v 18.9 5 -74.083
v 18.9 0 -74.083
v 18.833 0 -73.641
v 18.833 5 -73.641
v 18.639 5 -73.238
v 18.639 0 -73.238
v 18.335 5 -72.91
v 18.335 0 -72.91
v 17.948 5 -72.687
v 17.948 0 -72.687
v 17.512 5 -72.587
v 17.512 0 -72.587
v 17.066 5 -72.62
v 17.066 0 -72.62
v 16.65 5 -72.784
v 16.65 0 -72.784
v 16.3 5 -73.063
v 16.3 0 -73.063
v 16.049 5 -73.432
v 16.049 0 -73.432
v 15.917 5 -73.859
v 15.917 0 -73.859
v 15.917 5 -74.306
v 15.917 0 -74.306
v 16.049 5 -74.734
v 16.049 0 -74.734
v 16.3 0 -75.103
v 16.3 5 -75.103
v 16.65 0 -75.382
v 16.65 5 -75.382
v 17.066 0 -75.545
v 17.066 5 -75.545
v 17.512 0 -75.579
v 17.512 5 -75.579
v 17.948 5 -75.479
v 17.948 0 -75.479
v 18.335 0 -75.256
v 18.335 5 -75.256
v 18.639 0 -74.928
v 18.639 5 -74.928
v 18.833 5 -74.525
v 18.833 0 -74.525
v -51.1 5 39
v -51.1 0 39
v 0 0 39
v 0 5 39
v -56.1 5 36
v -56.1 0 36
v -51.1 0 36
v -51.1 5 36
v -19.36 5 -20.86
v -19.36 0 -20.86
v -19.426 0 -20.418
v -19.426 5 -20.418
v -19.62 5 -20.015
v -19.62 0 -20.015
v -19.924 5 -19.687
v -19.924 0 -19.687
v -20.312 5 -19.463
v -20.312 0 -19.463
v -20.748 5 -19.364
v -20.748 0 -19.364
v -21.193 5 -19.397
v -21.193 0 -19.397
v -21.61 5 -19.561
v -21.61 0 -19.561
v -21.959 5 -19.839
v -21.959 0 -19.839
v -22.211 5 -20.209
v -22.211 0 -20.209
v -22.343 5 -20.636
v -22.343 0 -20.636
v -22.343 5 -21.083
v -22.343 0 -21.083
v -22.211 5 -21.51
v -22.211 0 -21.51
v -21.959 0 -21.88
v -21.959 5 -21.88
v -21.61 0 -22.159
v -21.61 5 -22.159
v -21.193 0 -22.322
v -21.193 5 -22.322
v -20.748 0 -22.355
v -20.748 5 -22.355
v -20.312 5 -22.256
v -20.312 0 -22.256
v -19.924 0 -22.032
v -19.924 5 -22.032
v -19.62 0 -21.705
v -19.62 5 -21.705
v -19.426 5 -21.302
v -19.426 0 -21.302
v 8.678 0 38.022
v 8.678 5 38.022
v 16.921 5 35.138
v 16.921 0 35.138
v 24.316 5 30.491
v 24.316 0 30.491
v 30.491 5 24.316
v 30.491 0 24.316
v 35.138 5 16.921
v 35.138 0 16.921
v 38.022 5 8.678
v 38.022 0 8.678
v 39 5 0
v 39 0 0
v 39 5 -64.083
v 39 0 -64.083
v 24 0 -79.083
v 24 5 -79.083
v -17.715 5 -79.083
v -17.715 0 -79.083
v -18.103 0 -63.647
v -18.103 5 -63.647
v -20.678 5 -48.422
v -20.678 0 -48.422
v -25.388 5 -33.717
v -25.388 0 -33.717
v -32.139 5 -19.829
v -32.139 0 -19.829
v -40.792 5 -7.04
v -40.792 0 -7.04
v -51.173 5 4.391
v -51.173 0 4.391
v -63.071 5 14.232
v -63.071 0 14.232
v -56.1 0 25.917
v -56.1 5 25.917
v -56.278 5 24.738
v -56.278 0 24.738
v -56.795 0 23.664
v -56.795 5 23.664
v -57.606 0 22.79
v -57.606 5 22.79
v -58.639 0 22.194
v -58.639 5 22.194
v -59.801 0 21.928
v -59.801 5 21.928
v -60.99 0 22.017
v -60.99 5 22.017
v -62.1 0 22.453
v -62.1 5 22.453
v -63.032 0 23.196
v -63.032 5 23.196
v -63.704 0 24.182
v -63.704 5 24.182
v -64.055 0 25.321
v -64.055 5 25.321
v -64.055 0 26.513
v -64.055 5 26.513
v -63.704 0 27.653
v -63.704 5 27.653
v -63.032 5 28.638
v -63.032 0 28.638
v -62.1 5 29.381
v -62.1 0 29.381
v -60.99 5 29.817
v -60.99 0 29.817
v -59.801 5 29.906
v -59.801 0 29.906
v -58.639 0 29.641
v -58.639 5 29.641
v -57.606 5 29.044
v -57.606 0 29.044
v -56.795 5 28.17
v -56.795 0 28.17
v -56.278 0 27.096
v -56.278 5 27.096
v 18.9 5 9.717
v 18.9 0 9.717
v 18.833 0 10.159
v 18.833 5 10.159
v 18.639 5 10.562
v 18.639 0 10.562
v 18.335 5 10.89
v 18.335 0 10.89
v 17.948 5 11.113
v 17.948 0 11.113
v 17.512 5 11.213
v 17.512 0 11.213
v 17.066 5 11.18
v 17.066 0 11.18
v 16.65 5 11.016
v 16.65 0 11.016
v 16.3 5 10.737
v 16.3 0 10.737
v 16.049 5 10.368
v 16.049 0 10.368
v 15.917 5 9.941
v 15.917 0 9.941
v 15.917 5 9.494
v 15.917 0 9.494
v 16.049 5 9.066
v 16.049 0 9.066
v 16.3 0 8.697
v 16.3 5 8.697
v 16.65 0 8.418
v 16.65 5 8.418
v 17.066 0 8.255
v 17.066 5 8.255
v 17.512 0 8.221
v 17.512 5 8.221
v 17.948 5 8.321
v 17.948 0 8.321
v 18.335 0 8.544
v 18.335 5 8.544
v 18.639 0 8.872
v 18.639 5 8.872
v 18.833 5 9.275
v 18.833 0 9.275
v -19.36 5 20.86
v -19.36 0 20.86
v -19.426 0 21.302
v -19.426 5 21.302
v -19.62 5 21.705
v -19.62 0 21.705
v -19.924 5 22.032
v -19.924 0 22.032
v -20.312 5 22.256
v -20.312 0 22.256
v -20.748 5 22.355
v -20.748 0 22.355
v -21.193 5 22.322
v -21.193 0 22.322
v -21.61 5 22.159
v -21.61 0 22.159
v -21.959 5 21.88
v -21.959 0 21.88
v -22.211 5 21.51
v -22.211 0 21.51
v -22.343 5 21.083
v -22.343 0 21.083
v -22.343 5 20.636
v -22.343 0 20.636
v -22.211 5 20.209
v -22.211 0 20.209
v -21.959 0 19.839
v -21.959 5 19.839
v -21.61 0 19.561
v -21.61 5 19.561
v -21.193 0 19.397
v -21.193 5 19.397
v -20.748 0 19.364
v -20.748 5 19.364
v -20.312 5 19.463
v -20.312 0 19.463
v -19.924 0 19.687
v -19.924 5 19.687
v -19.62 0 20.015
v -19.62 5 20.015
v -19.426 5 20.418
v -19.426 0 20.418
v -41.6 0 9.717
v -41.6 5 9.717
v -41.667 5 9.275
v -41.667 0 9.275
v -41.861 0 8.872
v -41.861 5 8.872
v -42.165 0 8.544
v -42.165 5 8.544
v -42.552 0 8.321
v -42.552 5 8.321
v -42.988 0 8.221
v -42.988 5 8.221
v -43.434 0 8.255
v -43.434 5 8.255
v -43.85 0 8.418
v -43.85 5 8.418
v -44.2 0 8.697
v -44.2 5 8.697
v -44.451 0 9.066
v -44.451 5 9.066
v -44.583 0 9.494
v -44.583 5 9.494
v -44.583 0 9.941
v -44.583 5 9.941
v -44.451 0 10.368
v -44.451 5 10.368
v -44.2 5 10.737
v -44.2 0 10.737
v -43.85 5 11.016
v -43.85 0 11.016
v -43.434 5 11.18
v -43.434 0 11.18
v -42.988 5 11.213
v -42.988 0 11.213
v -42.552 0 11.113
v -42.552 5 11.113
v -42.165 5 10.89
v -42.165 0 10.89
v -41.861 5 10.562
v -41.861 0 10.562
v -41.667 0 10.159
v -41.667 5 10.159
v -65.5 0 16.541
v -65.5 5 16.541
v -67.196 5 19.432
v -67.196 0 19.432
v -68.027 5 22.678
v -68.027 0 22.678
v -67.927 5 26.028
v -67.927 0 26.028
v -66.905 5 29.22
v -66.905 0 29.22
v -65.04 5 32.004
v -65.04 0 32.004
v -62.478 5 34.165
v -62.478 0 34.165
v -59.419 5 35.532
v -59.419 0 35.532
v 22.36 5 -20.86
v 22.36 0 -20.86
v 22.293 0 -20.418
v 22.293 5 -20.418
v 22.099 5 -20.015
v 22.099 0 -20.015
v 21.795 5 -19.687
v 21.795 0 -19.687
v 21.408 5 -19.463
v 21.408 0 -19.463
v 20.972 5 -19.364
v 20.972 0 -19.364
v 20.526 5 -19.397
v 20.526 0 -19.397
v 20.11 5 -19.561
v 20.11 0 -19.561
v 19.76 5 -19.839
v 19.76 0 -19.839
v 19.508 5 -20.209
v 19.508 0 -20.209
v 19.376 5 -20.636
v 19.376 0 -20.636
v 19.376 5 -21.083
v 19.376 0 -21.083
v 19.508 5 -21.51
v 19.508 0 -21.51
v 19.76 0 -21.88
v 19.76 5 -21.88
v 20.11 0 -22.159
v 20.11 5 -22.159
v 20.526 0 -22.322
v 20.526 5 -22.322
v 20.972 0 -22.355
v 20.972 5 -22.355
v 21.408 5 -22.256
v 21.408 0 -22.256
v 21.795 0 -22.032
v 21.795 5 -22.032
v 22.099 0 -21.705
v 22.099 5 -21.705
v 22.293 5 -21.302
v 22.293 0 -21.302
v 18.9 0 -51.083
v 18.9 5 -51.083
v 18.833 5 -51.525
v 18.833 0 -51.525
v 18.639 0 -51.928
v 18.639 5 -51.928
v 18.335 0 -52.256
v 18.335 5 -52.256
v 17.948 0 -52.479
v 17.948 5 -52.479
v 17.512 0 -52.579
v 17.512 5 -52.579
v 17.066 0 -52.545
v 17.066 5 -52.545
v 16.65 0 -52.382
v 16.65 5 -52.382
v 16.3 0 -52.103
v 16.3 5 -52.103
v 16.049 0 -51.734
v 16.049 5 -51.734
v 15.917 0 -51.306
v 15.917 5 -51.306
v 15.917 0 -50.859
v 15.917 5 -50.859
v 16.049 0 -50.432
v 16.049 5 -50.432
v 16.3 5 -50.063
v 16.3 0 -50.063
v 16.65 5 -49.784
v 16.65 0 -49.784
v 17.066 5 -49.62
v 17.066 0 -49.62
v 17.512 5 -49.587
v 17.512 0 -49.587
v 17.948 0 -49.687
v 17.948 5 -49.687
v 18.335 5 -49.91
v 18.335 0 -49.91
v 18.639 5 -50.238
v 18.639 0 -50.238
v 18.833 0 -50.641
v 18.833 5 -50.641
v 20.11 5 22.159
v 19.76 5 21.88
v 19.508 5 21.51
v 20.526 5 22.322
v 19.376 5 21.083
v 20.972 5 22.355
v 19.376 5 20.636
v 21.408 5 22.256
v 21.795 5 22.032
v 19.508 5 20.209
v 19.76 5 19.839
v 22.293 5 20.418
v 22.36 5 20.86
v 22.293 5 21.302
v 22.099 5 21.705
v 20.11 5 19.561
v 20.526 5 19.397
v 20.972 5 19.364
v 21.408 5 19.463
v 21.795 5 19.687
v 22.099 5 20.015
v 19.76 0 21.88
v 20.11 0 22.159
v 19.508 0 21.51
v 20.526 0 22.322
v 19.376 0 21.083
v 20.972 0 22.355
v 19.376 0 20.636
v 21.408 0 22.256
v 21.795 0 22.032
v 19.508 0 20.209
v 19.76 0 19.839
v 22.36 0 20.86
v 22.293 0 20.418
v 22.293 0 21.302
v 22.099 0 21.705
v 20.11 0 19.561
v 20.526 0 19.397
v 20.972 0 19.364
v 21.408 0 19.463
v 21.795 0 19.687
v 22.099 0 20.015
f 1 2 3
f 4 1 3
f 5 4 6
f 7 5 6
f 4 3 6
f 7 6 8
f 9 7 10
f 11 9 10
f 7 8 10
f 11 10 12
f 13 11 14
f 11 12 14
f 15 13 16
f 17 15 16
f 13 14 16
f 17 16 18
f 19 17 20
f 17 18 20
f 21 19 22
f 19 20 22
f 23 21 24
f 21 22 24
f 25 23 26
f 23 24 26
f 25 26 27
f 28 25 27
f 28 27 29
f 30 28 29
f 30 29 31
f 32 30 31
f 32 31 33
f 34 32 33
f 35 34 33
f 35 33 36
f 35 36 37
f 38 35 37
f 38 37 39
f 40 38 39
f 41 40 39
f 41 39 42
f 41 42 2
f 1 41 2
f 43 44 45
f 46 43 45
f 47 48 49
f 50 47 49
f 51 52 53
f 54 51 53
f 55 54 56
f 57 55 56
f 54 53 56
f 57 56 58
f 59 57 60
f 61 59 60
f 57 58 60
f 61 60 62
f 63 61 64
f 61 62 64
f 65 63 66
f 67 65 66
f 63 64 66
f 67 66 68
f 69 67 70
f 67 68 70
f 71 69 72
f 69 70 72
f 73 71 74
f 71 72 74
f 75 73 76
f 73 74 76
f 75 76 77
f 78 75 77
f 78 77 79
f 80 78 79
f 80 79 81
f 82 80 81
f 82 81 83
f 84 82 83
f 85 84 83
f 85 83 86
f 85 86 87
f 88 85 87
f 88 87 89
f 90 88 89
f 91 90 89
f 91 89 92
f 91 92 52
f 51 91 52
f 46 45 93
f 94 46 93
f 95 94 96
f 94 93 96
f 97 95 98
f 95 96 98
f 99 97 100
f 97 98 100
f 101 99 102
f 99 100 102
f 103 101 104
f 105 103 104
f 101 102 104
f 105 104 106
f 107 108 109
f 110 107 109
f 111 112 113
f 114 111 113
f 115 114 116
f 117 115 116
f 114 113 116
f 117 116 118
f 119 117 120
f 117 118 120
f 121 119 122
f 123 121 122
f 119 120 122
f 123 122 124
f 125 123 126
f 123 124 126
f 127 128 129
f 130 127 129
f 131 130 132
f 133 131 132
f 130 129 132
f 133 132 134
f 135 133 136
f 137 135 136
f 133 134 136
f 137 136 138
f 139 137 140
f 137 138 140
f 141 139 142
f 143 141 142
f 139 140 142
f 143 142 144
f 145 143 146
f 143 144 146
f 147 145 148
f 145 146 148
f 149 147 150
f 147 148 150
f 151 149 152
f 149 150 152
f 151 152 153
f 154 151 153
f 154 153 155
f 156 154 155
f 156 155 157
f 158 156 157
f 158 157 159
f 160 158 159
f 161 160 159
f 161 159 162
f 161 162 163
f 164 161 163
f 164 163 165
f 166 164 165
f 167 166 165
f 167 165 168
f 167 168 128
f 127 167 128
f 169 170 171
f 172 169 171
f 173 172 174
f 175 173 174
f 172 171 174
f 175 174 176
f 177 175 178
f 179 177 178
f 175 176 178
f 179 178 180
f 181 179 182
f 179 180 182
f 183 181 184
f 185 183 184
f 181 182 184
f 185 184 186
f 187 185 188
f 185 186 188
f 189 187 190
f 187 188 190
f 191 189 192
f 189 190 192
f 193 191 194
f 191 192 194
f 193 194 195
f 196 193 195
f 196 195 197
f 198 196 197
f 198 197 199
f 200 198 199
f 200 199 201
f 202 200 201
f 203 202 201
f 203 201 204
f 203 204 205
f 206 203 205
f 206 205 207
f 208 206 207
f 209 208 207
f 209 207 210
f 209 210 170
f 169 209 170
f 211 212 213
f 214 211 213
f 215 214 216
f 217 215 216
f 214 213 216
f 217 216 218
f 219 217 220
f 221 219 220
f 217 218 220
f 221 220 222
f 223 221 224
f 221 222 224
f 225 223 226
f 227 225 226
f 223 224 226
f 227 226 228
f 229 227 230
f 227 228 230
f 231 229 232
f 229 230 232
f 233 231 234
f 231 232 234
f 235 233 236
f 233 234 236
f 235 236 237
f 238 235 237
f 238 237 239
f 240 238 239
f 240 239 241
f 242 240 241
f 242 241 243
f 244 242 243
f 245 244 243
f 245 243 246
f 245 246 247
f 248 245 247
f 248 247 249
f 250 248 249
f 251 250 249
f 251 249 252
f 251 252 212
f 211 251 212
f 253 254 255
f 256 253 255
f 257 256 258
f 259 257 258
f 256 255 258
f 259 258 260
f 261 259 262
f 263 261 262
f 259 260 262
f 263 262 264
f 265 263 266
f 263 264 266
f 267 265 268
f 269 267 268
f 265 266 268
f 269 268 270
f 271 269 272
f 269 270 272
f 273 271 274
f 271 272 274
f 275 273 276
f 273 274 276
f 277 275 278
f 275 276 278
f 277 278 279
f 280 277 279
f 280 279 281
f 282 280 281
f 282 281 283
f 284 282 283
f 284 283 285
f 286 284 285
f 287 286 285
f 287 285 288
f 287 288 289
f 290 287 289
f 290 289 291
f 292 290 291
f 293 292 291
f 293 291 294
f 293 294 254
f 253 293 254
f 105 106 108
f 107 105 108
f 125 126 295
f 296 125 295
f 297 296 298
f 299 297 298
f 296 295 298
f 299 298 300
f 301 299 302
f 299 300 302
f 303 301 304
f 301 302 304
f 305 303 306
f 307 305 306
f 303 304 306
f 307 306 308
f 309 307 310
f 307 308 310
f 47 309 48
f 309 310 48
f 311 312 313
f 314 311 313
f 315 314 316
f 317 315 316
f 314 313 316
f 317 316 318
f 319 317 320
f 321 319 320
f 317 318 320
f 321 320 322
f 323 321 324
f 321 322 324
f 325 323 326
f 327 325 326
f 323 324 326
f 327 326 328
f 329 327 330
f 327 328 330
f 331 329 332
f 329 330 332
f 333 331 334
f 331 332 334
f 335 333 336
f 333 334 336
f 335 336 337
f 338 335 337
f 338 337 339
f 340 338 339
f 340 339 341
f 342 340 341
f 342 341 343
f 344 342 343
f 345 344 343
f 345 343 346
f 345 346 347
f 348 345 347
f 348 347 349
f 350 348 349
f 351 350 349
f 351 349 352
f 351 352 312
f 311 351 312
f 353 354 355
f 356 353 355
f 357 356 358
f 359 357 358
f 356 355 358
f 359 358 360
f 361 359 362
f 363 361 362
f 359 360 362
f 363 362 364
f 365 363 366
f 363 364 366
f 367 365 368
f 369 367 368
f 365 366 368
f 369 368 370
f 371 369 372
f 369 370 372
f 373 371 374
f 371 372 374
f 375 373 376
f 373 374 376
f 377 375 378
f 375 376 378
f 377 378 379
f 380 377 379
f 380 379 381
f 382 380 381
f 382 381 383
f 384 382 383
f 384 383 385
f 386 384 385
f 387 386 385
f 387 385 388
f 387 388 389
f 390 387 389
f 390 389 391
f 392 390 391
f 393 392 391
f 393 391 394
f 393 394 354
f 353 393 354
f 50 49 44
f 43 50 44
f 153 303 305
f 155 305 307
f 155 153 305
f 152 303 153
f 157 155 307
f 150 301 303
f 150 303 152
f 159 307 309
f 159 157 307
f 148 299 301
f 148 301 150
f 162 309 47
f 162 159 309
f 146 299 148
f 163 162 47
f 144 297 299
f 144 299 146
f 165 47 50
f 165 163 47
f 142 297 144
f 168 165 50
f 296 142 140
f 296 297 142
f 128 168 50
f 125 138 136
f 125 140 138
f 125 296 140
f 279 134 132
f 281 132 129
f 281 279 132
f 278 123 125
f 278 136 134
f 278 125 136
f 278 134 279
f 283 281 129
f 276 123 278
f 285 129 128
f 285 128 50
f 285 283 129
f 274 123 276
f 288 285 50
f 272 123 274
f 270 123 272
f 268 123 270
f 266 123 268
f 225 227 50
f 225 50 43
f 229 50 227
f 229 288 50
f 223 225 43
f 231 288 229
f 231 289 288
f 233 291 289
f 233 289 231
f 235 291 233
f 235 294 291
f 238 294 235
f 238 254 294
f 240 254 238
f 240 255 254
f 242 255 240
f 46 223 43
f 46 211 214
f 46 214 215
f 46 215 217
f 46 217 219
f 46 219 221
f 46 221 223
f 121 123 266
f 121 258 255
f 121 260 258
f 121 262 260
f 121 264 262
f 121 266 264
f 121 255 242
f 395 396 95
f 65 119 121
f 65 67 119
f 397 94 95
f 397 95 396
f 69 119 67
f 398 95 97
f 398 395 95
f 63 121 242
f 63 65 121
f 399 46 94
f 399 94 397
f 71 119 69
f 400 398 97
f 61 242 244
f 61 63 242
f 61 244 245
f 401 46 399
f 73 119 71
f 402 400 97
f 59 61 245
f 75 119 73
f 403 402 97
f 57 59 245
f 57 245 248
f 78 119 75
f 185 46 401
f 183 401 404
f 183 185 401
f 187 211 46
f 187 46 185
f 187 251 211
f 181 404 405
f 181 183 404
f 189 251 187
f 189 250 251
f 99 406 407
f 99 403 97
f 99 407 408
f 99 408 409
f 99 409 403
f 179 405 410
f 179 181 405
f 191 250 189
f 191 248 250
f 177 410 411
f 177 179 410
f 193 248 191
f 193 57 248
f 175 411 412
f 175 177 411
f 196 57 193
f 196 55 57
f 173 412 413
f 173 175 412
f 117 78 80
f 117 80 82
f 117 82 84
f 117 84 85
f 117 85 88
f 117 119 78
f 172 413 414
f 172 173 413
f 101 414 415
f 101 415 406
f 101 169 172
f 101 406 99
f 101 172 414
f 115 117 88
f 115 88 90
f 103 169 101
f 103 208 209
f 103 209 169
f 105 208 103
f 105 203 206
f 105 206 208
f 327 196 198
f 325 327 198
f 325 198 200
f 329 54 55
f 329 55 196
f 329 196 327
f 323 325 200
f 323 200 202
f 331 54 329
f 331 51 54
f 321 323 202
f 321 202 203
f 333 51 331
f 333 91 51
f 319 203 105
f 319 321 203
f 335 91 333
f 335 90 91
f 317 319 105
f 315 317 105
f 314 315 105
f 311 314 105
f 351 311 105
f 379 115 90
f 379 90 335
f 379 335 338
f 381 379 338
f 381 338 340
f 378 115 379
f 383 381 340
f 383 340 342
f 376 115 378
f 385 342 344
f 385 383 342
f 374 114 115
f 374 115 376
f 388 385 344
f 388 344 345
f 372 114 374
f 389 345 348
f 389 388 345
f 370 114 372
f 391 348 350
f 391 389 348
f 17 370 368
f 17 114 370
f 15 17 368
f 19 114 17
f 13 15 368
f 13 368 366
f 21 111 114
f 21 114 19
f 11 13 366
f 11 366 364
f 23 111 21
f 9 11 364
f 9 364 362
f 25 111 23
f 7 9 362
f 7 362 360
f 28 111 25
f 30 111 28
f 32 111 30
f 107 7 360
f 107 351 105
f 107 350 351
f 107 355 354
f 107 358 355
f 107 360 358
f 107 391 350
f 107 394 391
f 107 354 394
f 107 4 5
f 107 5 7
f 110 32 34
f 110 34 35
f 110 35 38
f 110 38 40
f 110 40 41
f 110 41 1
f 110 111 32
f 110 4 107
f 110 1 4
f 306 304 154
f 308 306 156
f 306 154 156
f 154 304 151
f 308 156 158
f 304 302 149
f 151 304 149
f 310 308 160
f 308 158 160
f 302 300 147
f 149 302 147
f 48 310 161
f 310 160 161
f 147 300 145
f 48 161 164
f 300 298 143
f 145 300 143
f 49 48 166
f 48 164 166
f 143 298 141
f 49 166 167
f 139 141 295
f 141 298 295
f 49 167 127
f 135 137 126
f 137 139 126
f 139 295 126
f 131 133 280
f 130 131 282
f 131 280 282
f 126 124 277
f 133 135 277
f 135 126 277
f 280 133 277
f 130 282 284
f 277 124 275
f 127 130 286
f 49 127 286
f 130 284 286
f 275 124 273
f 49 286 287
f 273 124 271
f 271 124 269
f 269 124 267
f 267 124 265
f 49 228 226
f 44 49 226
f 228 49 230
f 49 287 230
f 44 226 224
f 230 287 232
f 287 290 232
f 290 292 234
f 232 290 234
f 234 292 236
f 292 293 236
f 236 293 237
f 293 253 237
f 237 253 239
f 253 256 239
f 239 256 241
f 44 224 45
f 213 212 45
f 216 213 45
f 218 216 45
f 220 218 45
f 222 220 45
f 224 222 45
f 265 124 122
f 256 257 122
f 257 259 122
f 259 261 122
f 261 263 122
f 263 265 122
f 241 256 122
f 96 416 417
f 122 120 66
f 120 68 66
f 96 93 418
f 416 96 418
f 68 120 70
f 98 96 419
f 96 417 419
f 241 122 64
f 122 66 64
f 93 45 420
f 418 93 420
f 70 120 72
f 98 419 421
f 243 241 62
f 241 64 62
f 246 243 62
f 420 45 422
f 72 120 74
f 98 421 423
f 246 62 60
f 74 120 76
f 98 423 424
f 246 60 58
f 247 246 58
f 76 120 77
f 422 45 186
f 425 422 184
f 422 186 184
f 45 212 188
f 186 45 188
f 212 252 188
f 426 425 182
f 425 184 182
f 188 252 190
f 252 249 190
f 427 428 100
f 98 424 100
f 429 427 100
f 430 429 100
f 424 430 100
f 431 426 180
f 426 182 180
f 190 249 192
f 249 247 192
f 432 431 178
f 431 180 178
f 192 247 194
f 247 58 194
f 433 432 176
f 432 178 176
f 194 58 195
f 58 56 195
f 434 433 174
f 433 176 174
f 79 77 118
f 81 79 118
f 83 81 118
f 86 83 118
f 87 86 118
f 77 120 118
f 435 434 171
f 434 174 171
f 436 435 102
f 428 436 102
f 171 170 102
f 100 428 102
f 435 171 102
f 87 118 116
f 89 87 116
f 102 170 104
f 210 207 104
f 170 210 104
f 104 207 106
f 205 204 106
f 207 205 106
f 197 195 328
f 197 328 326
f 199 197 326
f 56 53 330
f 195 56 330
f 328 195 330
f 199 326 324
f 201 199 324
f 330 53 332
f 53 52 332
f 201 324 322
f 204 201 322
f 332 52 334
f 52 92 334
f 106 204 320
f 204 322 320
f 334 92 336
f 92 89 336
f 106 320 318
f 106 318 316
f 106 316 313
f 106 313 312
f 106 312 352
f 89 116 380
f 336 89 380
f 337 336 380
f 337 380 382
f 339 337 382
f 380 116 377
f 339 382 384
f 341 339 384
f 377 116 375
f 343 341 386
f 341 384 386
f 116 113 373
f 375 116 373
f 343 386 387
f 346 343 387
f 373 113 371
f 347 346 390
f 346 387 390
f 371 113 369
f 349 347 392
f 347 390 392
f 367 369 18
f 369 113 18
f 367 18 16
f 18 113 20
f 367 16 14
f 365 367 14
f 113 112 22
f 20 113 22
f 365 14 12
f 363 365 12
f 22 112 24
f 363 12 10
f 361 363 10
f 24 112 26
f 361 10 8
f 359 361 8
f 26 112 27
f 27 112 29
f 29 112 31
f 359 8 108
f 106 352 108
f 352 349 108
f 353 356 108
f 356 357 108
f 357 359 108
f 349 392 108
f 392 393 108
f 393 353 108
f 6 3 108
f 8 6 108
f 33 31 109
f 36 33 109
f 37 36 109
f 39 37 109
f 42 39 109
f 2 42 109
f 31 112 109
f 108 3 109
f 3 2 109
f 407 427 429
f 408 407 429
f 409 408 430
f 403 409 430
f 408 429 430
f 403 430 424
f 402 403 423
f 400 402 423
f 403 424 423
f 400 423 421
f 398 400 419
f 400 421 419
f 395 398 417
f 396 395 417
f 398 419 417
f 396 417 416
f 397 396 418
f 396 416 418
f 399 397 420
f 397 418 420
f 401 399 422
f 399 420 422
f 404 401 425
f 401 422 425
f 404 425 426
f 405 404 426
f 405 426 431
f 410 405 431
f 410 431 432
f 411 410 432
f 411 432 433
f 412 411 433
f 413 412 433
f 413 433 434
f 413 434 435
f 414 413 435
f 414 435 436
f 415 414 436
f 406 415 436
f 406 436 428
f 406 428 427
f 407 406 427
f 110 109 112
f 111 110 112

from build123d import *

# Parameters (mm, degrees)
BOSS_EXTRU_1_DEPTH      = 5
ESQUISSE2_R             = 1.5
ENL_V_MAT_EXTRU_1_DEPTH = 6
ESQUISSE3_R             = 1.5
ENL_V_MAT_EXTRU_2_DEPTH = 6
ESQUISSE4_R             = 4
ENL_V_MAT_EXTRU_3_DEPTH = 6


with BuildPart() as part:
    # Esquisse1 → Boss.-Extru.1 (new body)
    with BuildSketch(Plane(origin=(0, 0, 0), x_dir=(1, 0, 0), z_dir=(0, 1, 0))):
        with BuildLine():
            Line((-51.1, -39), (0, -39))
            ThreePointArc((0, -39), (27.577164466, -27.577164466), (39, 0))
            Line((39, 0), (39, 64.082873123))
            Line((39, 64.082873123), (24, 79.082873123))
            Line((24, 79.082873123), (-17.715268603, 79.082873123))
            ThreePointArc((-17.715268603, 79.082873123), (-28.51615758, 26.652464115), (-63.070954357, -14.232410975))
            ThreePointArc((-63.070954357, -14.232410975), (-67.528277829, -27.659845058), (-56.1, -36))
            Line((-56.1, -36), (-51.1, -36))
            Line((-51.1, -36), (-51.1, -39))
        make_face()
    extrude(amount=BOSS_EXTRU_1_DEPTH)

    # Esquisse2 → Enlèv. mat.-Extru.1 (cut, through all)
    with BuildSketch(Plane.XZ):
        with Locations((20.859650045, 20.859650045)):
            Circle(ESQUISSE2_R)
        with Locations((20.859650045, -20.859650045)):
            Circle(ESQUISSE2_R)
        with Locations((-20.859650045, -20.859650045)):
            Circle(ESQUISSE2_R)
        with Locations((-20.859650045, 20.859650045)):
            Circle(ESQUISSE2_R)
        with Locations((17.4, -74.082873123)):
            Circle(ESQUISSE2_R)
        with Locations((17.4, 9.717126877)):
            Circle(ESQUISSE2_R)
    extrude(amount=-ENL_V_MAT_EXTRU_1_DEPTH, mode=Mode.SUBTRACT)

    # Esquisse3 → Enlèv. mat.-Extru.2 (cut, through all)
    with BuildSketch(Plane(origin=(0, 5, 0), x_dir=(1, 0, 0), z_dir=(0, 1, 0))):
        with Locations((17.4, 51.082873123)):
            Circle(ESQUISSE3_R)
        with Locations((-43.1, -9.717126877)):
            Circle(ESQUISSE3_R)
    extrude(amount=-ENL_V_MAT_EXTRU_2_DEPTH, mode=Mode.SUBTRACT)

    # Esquisse4 → Enlèv. mat.-Extru.3 (cut, through all)
    with BuildSketch(Plane(origin=(0, 5, 0), x_dir=(1, 0, 0), z_dir=(0, 1, 0))):
        with Locations((-60.1, -25.917126877)):
            Circle(ESQUISSE4_R)
    extrude(amount=-ENL_V_MAT_EXTRU_3_DEPTH, mode=Mode.SUBTRACT)


solid = part.part
